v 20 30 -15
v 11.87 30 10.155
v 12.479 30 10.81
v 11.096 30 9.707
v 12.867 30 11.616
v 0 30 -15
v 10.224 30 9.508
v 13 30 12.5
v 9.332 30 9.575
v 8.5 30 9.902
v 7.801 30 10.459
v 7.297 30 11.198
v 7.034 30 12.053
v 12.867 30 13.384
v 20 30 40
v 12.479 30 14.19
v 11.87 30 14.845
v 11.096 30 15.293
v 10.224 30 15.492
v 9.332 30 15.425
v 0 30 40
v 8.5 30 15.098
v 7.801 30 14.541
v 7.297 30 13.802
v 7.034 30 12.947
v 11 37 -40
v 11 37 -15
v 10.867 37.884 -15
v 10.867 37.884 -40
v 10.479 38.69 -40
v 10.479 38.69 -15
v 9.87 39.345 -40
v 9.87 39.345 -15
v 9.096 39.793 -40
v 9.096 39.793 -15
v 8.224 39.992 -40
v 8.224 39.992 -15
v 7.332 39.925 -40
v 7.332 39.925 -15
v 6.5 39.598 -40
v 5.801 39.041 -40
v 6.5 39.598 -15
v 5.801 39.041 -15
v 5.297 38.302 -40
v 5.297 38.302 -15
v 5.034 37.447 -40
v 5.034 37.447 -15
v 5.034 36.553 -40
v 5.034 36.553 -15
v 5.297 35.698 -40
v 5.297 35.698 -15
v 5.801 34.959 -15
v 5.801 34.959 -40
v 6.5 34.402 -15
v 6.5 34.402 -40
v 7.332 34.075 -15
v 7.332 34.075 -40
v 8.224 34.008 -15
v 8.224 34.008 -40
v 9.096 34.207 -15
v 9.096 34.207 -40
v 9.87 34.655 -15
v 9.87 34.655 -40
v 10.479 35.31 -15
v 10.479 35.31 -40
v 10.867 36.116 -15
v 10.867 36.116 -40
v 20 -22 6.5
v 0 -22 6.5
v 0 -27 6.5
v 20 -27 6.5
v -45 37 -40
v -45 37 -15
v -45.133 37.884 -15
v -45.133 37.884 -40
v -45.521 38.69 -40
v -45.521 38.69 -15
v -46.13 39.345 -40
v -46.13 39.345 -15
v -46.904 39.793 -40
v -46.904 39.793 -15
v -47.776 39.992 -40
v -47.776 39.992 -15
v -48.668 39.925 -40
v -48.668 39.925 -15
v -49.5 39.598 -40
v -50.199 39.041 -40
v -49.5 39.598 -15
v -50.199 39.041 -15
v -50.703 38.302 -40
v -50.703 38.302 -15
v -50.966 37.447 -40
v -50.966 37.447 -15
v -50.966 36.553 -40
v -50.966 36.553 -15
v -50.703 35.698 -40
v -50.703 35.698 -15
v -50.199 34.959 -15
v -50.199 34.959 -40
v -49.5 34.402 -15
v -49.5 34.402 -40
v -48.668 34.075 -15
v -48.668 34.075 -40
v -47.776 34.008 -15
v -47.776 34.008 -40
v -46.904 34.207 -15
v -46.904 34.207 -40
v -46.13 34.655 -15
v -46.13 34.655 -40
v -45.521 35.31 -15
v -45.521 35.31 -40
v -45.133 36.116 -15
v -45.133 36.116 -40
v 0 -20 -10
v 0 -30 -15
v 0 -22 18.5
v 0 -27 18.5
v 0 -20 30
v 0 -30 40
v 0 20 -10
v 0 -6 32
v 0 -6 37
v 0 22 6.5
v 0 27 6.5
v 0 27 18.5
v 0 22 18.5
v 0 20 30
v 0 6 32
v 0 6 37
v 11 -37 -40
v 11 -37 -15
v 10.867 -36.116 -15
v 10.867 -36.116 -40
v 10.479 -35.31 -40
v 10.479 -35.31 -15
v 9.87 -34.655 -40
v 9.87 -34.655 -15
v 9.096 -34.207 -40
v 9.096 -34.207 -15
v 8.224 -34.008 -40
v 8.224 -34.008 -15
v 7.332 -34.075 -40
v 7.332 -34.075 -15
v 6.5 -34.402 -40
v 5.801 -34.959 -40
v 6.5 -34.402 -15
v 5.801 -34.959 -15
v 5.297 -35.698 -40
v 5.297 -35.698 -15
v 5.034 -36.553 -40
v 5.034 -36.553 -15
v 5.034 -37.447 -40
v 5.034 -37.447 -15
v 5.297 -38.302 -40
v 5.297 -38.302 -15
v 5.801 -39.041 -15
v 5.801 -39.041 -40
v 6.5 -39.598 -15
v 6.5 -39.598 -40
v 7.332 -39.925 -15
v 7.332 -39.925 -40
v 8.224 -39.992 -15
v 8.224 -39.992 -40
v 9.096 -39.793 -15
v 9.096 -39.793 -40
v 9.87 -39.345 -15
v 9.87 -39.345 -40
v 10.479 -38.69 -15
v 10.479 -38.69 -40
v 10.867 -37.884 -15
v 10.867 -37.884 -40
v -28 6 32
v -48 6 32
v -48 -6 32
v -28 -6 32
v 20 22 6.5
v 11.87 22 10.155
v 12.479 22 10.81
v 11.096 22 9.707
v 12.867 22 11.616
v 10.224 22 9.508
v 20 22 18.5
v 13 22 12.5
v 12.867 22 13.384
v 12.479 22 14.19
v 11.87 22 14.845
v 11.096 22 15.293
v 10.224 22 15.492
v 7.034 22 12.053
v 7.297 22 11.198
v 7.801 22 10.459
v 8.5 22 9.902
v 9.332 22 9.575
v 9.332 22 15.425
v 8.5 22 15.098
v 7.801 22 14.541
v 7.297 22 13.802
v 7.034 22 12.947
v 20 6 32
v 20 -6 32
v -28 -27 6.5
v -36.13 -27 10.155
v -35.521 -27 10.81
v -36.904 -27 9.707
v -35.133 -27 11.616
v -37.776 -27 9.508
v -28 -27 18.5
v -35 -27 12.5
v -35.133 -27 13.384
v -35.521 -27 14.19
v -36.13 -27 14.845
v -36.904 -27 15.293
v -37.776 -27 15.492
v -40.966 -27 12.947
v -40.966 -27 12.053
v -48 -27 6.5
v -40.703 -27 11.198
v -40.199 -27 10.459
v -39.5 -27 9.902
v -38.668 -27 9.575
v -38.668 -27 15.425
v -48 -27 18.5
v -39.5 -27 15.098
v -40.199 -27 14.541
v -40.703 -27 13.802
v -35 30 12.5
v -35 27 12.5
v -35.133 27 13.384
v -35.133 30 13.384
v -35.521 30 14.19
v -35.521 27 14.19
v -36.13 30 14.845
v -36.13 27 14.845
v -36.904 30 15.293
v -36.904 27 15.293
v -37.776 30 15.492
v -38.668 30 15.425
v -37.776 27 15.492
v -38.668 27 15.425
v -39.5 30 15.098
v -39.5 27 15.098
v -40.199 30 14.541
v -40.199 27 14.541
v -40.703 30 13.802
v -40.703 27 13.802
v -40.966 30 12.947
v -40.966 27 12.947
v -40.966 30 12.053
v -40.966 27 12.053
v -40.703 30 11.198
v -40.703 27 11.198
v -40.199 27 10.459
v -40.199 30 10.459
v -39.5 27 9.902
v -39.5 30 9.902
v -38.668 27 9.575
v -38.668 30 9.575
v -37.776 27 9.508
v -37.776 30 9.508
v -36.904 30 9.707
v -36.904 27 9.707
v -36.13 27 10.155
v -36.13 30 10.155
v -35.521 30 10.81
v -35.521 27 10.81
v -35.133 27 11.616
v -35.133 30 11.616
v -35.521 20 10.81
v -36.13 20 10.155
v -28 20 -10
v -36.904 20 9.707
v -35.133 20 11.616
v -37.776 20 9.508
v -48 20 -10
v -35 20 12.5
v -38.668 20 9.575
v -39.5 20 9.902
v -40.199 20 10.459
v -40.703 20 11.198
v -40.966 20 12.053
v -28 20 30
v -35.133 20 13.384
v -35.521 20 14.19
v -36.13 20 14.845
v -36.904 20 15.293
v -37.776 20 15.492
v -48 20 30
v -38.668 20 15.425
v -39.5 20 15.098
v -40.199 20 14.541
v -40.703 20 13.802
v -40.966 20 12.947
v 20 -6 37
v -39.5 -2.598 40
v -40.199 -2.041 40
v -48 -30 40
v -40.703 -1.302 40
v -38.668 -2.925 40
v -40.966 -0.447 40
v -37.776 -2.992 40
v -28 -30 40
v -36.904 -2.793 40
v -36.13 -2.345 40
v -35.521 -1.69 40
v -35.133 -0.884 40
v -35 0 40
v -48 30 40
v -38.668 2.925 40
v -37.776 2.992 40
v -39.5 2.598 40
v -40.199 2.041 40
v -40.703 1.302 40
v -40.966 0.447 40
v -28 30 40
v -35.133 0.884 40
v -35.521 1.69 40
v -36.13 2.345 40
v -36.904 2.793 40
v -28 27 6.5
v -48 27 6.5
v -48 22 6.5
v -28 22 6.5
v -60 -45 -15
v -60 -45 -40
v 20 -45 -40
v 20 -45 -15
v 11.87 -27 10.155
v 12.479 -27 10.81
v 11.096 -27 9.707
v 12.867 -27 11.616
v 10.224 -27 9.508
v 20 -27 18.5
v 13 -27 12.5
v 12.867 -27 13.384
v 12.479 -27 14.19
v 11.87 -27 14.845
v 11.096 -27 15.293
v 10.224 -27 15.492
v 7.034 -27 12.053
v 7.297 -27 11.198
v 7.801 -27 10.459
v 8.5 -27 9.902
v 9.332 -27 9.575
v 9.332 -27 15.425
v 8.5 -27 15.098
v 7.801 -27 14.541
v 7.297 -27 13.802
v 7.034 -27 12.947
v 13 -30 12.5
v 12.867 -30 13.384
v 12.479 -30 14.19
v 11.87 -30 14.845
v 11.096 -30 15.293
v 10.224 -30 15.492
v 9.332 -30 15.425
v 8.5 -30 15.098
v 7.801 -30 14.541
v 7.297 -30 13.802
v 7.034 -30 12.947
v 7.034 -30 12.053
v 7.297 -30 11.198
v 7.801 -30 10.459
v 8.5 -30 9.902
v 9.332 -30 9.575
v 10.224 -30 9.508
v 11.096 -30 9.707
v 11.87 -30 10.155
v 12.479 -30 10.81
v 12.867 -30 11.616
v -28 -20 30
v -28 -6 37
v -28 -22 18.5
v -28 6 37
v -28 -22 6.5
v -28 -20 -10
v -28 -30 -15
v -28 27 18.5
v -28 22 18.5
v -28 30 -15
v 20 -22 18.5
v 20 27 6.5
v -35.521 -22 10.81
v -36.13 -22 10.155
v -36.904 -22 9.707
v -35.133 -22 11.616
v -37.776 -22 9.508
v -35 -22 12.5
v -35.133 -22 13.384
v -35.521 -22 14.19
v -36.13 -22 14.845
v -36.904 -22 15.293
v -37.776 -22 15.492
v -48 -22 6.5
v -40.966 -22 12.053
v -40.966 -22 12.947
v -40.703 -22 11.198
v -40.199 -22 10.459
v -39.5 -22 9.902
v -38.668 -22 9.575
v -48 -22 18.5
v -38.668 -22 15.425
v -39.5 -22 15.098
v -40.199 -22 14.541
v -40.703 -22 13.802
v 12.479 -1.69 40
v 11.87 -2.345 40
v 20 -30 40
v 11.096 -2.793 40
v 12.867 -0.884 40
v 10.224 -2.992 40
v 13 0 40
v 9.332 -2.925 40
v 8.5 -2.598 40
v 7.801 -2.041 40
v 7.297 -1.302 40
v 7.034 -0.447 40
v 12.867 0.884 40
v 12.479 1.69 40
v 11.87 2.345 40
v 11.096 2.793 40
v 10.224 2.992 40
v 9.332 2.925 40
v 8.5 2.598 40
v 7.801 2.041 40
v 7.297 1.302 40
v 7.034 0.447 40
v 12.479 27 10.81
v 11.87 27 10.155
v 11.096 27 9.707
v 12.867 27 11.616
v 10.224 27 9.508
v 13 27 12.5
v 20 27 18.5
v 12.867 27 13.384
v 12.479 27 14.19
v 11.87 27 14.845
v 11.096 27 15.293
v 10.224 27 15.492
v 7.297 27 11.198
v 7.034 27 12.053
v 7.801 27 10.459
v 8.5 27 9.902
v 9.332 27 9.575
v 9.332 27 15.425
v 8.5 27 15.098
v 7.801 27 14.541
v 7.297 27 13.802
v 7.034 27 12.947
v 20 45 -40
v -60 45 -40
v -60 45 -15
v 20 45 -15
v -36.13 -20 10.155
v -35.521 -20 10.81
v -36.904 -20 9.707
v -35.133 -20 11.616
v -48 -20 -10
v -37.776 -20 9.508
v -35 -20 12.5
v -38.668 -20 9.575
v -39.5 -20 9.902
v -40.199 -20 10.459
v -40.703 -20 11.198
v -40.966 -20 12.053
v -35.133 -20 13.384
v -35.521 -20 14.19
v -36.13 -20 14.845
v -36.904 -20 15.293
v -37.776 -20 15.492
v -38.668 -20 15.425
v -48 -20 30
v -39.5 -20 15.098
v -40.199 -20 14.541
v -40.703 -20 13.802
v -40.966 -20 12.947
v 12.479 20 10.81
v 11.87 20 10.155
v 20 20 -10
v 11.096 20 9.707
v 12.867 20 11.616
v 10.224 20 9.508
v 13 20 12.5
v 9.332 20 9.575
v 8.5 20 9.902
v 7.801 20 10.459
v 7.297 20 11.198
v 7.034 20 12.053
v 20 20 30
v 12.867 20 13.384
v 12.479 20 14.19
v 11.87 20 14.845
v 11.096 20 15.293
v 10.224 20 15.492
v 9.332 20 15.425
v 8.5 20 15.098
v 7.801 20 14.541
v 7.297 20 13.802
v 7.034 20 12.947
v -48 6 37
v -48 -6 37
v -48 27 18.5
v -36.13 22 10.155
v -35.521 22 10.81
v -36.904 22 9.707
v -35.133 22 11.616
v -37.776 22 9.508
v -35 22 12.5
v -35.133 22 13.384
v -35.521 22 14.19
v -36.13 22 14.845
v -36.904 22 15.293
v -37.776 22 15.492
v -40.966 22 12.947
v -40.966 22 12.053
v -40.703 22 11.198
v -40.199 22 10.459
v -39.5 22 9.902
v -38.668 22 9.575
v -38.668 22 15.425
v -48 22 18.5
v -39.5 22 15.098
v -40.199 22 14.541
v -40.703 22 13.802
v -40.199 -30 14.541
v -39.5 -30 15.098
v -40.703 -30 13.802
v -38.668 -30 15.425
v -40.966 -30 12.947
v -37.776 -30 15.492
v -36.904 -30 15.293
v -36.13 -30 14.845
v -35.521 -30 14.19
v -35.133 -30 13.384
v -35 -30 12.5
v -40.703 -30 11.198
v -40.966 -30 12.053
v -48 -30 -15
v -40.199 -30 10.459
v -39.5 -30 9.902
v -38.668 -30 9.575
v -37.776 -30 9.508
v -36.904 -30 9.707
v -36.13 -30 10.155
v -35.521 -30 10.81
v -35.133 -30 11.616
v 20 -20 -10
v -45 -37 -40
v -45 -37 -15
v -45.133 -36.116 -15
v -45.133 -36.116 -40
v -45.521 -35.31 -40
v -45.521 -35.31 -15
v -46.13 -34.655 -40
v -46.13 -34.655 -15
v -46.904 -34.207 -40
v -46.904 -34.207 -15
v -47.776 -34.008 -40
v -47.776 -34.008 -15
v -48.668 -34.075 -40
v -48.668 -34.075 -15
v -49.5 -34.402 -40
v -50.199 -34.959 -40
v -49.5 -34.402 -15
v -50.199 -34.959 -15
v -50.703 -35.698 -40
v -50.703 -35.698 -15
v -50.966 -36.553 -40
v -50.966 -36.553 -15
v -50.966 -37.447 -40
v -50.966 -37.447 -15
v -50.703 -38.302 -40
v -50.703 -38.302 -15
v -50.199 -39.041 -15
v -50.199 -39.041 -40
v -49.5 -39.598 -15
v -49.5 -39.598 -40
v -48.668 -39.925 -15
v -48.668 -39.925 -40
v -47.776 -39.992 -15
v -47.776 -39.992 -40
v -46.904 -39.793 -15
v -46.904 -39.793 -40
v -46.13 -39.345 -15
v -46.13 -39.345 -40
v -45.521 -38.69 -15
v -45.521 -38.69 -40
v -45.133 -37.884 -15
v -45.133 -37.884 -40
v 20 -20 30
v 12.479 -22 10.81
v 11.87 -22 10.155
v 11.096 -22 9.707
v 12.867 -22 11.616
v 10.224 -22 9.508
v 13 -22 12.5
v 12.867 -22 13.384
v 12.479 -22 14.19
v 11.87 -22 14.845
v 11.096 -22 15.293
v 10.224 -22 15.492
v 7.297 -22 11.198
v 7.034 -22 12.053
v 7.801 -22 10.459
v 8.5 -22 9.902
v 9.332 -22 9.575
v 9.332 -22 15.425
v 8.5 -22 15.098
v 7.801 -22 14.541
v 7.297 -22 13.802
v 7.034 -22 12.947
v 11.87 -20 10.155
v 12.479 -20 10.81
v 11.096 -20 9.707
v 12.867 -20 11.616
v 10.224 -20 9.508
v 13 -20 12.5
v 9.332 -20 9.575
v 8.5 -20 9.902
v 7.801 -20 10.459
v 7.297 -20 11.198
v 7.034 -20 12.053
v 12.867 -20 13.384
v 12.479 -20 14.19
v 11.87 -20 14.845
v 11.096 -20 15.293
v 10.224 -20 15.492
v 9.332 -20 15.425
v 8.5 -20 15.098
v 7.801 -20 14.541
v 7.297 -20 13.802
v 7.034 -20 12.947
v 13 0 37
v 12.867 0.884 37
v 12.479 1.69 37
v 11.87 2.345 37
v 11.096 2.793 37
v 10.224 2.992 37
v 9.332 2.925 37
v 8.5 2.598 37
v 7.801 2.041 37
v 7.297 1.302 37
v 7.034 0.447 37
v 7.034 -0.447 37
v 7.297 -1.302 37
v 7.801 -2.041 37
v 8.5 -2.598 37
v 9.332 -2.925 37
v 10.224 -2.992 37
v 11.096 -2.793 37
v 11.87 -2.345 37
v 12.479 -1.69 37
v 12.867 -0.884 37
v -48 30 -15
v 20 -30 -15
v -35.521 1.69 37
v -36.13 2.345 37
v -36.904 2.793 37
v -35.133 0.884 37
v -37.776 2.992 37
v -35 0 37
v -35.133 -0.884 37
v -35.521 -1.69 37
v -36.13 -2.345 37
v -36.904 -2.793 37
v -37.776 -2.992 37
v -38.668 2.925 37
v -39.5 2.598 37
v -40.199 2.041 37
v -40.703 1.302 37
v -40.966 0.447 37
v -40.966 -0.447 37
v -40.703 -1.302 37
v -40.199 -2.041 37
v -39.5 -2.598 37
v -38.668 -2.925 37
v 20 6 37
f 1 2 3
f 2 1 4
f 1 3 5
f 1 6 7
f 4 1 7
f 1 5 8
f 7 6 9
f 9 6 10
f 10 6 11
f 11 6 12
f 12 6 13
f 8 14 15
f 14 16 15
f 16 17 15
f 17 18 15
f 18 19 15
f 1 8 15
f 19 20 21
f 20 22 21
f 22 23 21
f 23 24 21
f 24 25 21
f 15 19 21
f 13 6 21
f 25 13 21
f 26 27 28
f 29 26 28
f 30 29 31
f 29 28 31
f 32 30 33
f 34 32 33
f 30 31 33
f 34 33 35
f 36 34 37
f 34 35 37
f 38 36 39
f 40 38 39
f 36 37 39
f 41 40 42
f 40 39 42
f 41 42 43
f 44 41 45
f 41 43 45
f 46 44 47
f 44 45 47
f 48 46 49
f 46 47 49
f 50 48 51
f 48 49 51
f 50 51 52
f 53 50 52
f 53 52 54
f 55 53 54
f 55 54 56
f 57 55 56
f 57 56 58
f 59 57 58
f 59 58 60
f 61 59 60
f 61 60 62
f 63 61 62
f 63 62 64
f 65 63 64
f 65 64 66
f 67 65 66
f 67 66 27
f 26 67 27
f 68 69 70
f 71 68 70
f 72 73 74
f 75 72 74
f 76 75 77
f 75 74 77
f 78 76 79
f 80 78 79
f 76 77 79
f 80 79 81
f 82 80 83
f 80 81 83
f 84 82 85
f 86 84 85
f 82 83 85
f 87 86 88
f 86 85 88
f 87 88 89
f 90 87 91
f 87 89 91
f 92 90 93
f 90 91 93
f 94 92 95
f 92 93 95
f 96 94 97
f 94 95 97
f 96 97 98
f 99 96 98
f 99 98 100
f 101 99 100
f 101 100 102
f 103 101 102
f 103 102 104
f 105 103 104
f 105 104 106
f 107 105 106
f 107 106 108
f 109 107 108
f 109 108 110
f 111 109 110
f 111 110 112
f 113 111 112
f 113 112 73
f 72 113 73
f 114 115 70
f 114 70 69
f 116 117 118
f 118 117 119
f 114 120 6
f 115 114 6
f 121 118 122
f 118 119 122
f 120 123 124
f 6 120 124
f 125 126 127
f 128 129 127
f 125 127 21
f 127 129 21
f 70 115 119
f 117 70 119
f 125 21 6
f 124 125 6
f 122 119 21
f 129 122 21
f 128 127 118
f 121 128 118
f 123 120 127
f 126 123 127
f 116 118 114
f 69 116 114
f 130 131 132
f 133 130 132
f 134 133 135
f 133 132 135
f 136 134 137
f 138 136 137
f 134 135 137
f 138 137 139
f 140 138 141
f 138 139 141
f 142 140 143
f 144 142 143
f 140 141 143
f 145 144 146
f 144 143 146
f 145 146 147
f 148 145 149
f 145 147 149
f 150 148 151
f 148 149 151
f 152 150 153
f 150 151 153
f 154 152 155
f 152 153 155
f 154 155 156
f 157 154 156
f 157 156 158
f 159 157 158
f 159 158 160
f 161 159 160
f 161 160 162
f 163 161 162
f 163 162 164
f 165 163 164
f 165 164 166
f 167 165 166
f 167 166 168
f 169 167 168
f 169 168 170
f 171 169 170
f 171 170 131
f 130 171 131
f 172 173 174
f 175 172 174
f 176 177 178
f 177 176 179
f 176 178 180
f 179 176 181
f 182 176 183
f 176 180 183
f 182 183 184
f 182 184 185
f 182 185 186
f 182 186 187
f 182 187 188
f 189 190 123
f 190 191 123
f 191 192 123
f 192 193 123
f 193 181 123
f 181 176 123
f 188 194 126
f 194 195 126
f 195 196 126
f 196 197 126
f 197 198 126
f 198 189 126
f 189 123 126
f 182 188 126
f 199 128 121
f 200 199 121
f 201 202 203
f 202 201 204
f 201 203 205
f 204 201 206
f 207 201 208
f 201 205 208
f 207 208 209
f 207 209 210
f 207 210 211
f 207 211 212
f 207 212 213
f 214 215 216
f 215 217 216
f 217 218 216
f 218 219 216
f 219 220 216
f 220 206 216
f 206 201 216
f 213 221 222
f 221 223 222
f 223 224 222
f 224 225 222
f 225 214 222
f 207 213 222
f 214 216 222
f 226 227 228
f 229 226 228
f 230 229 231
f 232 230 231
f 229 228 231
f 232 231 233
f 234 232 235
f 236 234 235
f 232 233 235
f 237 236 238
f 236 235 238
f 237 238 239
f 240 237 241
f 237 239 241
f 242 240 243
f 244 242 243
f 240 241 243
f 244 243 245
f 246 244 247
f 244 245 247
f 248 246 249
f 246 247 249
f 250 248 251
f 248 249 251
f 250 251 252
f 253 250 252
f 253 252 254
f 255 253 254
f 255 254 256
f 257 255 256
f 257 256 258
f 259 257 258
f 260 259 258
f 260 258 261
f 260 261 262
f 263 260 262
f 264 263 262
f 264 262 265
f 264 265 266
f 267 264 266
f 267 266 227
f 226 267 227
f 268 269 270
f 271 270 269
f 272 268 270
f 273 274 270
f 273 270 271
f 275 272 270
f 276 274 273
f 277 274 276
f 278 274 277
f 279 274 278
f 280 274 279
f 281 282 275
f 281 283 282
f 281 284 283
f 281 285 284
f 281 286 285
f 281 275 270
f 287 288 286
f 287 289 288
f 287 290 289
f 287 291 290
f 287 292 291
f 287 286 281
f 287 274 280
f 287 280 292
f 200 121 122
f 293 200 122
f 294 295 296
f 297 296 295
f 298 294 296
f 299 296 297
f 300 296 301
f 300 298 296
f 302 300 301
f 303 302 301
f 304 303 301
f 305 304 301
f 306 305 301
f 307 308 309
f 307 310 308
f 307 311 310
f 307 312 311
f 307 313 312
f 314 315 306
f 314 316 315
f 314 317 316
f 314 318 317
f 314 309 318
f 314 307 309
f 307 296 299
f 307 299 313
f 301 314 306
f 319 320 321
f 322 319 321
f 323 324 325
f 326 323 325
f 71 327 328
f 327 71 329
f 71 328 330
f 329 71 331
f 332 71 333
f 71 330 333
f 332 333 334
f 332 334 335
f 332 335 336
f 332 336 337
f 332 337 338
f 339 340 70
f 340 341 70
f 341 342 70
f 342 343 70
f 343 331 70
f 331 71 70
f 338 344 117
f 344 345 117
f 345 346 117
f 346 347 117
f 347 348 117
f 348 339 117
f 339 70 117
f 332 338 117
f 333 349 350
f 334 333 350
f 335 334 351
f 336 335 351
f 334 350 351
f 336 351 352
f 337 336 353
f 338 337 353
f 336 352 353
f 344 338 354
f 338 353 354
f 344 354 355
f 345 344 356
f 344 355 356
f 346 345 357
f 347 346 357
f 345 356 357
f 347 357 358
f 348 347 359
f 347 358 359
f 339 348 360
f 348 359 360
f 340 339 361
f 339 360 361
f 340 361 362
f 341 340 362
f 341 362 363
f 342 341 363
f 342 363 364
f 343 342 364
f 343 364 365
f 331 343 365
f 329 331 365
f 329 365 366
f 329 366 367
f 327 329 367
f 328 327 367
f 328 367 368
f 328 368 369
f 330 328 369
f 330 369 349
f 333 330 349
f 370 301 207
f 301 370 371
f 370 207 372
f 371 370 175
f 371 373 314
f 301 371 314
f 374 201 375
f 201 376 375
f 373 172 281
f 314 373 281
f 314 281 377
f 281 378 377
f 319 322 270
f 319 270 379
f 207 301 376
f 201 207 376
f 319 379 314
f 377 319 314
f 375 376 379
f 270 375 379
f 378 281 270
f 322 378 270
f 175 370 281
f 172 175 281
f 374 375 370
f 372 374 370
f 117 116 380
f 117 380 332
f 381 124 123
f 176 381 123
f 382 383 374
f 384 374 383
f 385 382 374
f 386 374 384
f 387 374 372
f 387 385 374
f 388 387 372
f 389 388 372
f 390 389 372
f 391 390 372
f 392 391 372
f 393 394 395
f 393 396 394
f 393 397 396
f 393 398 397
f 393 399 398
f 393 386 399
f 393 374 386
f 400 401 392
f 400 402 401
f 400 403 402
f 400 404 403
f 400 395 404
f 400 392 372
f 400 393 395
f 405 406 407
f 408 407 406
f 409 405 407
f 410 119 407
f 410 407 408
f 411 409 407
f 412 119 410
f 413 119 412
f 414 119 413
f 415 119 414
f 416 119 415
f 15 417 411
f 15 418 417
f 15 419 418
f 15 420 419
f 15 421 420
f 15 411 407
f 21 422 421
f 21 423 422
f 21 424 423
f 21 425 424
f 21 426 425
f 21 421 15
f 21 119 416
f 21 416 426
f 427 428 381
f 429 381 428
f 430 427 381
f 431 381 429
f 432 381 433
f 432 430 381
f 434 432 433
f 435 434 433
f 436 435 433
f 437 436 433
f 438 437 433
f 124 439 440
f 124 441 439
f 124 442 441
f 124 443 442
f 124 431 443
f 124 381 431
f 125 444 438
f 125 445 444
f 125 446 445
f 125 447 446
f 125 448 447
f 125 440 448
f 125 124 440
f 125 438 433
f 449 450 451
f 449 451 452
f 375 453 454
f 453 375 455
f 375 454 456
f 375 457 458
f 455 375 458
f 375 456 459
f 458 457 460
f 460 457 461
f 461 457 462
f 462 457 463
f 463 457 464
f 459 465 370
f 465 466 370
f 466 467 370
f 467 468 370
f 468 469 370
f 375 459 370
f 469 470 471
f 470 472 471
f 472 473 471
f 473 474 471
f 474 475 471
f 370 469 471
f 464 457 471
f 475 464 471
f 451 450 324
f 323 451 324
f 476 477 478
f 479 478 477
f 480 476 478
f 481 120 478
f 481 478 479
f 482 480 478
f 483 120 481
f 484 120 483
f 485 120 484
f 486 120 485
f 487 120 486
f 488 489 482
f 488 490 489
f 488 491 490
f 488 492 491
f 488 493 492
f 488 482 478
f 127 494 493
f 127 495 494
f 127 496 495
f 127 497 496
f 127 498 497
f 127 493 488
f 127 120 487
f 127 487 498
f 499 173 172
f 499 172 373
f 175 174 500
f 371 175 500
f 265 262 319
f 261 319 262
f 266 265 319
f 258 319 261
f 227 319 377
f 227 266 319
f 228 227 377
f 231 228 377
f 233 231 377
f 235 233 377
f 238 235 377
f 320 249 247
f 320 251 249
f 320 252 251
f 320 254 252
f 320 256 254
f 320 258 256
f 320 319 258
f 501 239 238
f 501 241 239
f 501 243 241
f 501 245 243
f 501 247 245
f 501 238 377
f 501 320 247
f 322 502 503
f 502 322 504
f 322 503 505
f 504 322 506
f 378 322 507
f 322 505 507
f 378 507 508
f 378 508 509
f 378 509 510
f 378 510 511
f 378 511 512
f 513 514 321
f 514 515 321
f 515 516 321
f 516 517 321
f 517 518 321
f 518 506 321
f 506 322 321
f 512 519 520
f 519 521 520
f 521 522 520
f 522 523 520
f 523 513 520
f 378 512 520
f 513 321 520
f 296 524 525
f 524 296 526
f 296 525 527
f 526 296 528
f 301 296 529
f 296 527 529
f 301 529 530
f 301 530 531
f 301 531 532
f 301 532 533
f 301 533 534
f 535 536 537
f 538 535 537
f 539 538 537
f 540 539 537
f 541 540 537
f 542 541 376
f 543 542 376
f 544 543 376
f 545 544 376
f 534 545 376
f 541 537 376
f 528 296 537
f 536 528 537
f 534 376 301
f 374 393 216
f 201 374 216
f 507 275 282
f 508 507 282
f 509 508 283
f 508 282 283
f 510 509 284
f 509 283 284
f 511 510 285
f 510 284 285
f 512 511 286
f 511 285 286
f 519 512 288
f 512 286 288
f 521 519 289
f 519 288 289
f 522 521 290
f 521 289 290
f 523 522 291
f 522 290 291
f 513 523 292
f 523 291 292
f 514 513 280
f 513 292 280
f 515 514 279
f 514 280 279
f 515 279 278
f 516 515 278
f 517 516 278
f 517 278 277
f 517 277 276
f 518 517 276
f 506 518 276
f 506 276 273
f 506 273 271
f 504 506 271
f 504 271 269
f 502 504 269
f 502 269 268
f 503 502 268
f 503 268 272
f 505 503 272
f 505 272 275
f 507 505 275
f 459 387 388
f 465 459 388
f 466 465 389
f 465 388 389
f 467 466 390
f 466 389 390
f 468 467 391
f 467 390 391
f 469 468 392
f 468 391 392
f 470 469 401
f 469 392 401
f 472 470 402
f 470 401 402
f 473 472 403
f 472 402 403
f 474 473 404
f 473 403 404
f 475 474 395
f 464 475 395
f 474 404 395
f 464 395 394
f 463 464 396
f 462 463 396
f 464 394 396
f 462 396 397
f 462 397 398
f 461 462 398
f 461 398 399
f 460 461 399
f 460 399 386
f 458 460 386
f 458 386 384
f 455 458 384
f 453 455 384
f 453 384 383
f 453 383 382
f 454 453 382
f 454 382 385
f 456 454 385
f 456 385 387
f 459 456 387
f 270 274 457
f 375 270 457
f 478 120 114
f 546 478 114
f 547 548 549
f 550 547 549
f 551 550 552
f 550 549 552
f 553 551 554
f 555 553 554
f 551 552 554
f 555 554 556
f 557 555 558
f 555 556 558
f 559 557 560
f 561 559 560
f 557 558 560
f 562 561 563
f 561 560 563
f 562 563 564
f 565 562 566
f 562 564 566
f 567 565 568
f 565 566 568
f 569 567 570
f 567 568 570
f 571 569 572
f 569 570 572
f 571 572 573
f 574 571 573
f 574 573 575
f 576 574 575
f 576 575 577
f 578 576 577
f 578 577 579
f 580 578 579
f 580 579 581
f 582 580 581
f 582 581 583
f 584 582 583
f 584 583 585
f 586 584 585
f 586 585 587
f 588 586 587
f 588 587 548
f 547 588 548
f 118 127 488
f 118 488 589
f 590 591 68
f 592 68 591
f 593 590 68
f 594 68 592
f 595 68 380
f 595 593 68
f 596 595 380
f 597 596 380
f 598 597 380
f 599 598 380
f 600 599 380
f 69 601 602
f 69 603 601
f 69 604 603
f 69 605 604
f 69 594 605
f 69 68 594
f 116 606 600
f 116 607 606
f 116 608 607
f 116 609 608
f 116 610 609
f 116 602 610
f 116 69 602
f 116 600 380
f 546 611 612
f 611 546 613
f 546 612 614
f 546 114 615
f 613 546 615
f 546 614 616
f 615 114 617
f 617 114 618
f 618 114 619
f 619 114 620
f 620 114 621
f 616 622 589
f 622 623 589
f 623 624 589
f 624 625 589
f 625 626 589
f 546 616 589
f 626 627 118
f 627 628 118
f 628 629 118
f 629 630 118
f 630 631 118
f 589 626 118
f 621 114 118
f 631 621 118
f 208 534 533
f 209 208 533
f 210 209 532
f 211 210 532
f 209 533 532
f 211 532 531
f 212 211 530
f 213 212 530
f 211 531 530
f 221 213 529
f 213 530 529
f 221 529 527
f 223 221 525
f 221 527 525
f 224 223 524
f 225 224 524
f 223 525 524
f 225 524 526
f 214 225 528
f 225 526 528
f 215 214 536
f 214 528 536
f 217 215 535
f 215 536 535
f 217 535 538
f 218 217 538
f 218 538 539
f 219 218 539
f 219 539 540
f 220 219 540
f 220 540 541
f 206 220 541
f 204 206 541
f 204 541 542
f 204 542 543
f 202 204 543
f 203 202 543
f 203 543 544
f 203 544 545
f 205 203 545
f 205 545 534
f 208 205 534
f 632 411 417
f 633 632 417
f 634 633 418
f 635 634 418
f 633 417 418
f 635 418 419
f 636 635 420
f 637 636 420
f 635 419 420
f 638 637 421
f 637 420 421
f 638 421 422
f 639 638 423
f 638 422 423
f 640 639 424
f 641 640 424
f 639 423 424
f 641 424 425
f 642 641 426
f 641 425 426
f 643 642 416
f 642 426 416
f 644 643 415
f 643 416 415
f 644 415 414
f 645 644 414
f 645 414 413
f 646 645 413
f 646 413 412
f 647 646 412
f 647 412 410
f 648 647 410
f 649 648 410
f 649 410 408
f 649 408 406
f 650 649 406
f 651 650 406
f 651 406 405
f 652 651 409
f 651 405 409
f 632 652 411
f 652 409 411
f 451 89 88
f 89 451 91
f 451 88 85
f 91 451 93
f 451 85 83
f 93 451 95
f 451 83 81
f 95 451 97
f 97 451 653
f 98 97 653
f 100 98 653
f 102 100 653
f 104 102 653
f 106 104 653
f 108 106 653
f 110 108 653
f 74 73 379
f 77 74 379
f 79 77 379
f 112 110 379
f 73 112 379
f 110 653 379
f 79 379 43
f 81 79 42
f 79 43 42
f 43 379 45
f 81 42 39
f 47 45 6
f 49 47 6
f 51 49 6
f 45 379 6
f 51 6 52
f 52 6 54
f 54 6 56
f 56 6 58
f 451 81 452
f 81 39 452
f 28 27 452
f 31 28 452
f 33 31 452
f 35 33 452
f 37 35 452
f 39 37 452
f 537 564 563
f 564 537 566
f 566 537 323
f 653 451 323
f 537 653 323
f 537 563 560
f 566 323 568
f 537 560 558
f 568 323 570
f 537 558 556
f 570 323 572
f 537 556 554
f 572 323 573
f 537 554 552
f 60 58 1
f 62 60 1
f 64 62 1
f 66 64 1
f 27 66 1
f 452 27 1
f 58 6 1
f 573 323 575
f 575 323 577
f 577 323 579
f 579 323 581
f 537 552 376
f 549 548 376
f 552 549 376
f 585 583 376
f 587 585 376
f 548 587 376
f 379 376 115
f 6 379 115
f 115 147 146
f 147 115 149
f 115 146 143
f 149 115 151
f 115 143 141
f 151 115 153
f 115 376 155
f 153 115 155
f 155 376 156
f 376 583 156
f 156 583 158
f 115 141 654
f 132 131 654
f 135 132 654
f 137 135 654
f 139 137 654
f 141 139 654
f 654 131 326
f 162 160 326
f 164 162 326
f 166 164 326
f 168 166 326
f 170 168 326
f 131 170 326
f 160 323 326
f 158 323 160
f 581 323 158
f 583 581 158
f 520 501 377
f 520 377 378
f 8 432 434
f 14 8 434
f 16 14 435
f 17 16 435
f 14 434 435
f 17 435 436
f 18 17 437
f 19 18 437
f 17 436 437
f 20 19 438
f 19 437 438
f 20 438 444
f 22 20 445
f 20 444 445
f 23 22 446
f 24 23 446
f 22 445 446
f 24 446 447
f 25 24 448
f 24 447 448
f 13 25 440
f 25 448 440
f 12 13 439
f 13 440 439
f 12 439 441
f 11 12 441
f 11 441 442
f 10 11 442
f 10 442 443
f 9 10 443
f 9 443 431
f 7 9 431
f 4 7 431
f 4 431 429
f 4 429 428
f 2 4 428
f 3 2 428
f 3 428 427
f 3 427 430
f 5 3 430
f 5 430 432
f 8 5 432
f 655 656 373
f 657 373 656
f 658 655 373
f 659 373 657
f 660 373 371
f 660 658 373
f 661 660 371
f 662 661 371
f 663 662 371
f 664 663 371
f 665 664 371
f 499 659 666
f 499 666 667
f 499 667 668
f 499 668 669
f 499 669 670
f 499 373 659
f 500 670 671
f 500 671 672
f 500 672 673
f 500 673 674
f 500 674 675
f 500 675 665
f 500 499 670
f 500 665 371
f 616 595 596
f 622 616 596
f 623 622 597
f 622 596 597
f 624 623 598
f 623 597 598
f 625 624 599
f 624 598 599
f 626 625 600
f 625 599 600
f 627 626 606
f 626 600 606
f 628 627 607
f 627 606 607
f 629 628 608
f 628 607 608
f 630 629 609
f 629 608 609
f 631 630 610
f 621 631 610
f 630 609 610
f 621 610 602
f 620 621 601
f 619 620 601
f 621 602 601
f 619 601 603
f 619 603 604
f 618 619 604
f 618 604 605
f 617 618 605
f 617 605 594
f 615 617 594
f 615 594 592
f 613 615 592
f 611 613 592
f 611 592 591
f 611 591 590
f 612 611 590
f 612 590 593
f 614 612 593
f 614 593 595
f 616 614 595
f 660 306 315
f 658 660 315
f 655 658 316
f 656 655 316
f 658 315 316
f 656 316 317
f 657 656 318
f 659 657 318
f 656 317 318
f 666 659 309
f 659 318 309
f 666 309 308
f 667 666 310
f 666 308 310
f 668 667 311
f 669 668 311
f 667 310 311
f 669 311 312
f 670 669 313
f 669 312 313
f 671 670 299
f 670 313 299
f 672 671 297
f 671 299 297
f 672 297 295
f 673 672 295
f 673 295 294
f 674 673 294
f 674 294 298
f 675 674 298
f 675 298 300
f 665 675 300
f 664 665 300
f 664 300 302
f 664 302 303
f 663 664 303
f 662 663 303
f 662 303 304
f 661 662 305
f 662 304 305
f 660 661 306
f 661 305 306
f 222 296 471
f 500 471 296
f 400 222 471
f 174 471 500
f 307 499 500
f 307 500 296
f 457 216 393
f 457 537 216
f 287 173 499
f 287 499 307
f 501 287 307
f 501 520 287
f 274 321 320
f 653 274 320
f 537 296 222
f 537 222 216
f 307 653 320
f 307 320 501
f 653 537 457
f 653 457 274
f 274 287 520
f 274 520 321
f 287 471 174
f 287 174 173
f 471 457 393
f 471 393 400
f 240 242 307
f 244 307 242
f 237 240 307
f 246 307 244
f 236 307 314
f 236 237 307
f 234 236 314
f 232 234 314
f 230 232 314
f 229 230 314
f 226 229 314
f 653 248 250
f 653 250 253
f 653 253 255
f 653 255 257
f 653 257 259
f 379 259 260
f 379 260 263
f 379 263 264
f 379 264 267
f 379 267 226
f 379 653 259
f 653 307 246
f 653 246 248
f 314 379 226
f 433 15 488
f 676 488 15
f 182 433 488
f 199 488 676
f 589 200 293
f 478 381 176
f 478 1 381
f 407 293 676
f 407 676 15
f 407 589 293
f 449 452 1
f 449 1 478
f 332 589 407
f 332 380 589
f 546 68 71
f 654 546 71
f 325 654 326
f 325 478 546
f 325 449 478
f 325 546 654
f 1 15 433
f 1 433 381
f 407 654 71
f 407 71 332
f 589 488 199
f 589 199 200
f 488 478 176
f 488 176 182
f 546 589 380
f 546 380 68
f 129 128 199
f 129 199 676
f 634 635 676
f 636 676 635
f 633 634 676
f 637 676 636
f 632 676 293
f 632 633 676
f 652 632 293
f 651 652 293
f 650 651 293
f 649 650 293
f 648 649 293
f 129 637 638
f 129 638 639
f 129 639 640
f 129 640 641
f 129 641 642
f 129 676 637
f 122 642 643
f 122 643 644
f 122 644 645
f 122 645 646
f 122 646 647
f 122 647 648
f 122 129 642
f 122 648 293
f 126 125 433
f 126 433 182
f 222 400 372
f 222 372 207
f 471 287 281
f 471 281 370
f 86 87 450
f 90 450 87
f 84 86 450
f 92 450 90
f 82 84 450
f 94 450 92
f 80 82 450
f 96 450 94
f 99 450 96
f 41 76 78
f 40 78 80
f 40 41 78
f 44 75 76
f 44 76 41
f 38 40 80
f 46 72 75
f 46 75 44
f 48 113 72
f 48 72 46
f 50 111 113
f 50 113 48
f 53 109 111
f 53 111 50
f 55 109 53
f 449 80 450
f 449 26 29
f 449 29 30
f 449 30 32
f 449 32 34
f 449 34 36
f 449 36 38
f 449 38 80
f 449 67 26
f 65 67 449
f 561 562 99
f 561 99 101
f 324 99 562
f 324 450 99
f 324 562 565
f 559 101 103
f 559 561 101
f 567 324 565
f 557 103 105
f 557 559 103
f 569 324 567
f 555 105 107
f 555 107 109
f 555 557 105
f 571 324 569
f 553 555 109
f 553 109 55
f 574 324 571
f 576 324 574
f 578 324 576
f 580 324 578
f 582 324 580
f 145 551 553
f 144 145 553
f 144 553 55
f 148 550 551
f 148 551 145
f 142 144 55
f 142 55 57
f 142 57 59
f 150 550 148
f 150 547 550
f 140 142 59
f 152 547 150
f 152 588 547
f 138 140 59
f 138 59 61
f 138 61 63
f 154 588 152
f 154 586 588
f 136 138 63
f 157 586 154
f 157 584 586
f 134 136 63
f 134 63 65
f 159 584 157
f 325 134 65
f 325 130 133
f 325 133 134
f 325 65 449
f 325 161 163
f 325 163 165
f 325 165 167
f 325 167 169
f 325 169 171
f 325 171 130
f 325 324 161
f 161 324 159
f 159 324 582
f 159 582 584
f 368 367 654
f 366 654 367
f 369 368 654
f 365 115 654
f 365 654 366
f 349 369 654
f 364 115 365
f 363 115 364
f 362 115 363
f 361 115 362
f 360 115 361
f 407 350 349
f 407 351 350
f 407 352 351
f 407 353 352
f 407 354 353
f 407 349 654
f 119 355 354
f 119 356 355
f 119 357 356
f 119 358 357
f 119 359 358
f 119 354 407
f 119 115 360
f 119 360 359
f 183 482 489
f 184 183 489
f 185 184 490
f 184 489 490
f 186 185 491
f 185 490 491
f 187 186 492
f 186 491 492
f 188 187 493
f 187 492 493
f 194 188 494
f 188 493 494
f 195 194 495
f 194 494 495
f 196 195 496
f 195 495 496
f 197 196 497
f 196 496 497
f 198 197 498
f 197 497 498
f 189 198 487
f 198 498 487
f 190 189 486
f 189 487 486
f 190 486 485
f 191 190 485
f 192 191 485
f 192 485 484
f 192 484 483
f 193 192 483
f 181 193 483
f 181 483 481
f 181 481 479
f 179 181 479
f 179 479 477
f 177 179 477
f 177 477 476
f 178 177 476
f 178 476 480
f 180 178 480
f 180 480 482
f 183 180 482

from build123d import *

# Parameters (mm, degrees)
F0_W      = 60
F0_H      = 80
F1_DEPTH  = 20
F2_W      = 80
F2_H      = 90
F3_DEPTH  = 25
F4_R      = 3
F5_DEPTH  = 25.001
F6_W      = 20
F6_H      = 60
F7_DEPTH  = 55
F8_W      = 40
F8_H      = 40
F8_W_2    = 5
F8_H_2    = 12
F8_W_3    = 12
F8_H_3    = 5
F9_DEPTH  = 68.001
F10_R     = 3
F11_DEPTH = 75.001
F12_R     = 3
F13_DEPTH = 3


with BuildPart() as f1:
    # F0 (on Right) → F1 (new body)
    with BuildSketch(Plane.YZ):
        Rectangle(F0_W, F0_H)
    extrude(amount=F1_DEPTH)

    # F2 (on face) → F3 (join)
    with BuildSketch(Plane(origin=(0, 0, -40), x_dir=(1, 0, 0), z_dir=(0, 0, -1))):
        with Locations((-20, 0)):
            Rectangle(F2_W, F2_H)
    extrude(amount=-F3_DEPTH)

    # F4 (on face) → F5 (cut, through all)
    with BuildSketch(Plane.XY.offset(-15)):
        with Locations((-48, 37)):
            Circle(F4_R)
        with Locations((-48, -37)):
            Circle(F4_R)
        with Locations((8, -37)):
            Circle(F4_R)
        with Locations((8, 37)):
            Circle(F4_R)
    extrude(amount=-F5_DEPTH, mode=Mode.SUBTRACT)

    # F6 (on face) → F7 (join, through all)
    with BuildSketch(Plane.XY.offset(-15)):
        with Locations((-38, 0)):
            Rectangle(F6_W, F6_H)
    extrude(amount=F7_DEPTH)

    # F8 (on face) → F9 (cut, through all)
    with BuildSketch(Plane(origin=(-48, 0, 0), x_dir=(0, -1, 0), z_dir=(-1, 0, 0))):
        with Locations((0, 10)):
            Rectangle(F8_W, F8_H)
        with Locations((-24.5, 12.5)):
            Rectangle(F8_W_2, F8_H_2)
        with Locations((0, 34.5)):
            Rectangle(F8_W_3, F8_H_3)
        with Locations((24.5, 12.5)):
            Rectangle(F8_W_2, F8_H_2)
    extrude(amount=-F9_DEPTH, mode=Mode.SUBTRACT)

    # F10 (on face) → F11 (cut, through all)
    with BuildSketch(Plane.XZ.offset(30)):
        with Locations((-38, 12.5)):
            Circle(F10_R)
        with Locations((10, 12.5)):
            Circle(F10_R)
    extrude(amount=-F11_DEPTH, mode=Mode.SUBTRACT)

    # F12 (on face) → F13 (cut, through all)
    with BuildSketch(Plane.XY.offset(40)):
        with Locations((-38, 0)):
            Circle(F12_R)
        with Locations((10, 0)):
            Circle(F12_R)
    extrude(amount=-F13_DEPTH, mode=Mode.SUBTRACT)


solid = f1.part
